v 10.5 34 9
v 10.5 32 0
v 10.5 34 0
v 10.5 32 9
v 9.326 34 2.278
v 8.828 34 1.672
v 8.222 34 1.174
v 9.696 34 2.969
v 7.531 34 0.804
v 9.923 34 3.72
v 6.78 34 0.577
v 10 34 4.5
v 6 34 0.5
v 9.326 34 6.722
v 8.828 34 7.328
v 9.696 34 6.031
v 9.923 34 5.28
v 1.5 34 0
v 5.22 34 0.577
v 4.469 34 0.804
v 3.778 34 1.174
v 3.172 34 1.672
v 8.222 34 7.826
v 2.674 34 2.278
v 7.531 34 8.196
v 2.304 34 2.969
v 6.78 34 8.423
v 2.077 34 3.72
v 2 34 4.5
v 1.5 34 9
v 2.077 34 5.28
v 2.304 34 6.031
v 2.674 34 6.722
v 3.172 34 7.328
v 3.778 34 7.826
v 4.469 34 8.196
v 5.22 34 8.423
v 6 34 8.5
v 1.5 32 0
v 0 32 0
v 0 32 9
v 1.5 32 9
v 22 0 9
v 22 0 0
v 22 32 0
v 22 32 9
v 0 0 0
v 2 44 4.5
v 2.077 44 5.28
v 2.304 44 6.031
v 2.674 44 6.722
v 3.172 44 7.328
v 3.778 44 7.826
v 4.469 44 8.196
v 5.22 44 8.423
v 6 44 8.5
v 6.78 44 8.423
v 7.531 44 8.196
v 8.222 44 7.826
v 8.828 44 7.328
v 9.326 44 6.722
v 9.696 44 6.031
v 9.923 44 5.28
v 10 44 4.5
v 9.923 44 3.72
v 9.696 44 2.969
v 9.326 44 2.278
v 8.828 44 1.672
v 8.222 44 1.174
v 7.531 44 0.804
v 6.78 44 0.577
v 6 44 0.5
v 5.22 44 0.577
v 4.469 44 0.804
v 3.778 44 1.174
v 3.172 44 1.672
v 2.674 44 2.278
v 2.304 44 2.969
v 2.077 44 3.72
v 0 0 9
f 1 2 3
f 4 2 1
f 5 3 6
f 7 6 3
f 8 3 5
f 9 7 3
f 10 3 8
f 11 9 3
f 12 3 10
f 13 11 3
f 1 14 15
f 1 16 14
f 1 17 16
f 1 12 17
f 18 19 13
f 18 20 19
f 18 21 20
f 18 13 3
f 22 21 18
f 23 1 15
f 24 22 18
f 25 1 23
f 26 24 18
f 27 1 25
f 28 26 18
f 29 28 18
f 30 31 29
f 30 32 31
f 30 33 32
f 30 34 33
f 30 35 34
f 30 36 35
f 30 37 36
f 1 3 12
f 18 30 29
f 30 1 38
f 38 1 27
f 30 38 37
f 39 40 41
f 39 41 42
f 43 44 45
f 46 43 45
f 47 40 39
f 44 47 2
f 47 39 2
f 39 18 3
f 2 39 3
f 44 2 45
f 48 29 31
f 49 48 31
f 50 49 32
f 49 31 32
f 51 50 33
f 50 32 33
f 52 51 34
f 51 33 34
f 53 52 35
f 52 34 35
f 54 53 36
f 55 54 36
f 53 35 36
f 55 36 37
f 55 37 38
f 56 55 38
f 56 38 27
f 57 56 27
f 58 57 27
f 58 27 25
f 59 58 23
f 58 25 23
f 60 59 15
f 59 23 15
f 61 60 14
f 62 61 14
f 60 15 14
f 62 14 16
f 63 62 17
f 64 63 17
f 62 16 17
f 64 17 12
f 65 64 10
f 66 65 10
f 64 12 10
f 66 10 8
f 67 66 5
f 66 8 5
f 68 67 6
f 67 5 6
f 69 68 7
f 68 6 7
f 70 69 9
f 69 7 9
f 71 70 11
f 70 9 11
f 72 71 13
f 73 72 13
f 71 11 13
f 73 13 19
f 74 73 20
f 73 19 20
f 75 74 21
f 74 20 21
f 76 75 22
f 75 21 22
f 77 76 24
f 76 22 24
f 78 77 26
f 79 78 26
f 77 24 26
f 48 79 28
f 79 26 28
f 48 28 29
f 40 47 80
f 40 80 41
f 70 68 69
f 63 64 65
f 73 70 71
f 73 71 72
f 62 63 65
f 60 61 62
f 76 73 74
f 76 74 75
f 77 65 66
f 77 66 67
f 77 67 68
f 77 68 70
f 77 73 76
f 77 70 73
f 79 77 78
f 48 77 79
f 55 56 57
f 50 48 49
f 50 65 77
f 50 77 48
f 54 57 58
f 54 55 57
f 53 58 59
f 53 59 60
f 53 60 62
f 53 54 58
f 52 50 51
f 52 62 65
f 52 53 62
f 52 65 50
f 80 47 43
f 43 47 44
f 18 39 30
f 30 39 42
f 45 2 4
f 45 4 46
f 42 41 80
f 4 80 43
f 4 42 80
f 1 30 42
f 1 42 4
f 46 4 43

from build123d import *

# Parameters (mm, degrees)
F0_W     = 22
F0_H     = 32
F1_DEPTH = 9
F2_W     = 9
F2_H     = 9
F3_DEPTH = 2
F4_R     = 4
F5_DEPTH = 10


with BuildPart() as f1:
    # F0 (on Top) → F1 (new body)
    with BuildSketch(Plane.XY):
        with Locations((11, 16)):
            Rectangle(F0_W, F0_H)
    extrude(amount=F1_DEPTH)

    # F2 (on face) → F3 (join)
    with BuildSketch(Plane(origin=(0, 32, 0), x_dir=(-1, 0, 0), z_dir=(0, 1, 0))):
        with Locations((-6, 4.5)):
            Rectangle(F2_W, F2_H)
    extrude(amount=F3_DEPTH)

    # F4 (on face) → F5 (join)
    with BuildSketch(Plane(origin=(0, 34, 0), x_dir=(-1, 0, 0), z_dir=(0, 1, 0))):
        with Locations((-6, 4.5)):
            Circle(F4_R)
    extrude(amount=F5_DEPTH)


solid = f1.part
